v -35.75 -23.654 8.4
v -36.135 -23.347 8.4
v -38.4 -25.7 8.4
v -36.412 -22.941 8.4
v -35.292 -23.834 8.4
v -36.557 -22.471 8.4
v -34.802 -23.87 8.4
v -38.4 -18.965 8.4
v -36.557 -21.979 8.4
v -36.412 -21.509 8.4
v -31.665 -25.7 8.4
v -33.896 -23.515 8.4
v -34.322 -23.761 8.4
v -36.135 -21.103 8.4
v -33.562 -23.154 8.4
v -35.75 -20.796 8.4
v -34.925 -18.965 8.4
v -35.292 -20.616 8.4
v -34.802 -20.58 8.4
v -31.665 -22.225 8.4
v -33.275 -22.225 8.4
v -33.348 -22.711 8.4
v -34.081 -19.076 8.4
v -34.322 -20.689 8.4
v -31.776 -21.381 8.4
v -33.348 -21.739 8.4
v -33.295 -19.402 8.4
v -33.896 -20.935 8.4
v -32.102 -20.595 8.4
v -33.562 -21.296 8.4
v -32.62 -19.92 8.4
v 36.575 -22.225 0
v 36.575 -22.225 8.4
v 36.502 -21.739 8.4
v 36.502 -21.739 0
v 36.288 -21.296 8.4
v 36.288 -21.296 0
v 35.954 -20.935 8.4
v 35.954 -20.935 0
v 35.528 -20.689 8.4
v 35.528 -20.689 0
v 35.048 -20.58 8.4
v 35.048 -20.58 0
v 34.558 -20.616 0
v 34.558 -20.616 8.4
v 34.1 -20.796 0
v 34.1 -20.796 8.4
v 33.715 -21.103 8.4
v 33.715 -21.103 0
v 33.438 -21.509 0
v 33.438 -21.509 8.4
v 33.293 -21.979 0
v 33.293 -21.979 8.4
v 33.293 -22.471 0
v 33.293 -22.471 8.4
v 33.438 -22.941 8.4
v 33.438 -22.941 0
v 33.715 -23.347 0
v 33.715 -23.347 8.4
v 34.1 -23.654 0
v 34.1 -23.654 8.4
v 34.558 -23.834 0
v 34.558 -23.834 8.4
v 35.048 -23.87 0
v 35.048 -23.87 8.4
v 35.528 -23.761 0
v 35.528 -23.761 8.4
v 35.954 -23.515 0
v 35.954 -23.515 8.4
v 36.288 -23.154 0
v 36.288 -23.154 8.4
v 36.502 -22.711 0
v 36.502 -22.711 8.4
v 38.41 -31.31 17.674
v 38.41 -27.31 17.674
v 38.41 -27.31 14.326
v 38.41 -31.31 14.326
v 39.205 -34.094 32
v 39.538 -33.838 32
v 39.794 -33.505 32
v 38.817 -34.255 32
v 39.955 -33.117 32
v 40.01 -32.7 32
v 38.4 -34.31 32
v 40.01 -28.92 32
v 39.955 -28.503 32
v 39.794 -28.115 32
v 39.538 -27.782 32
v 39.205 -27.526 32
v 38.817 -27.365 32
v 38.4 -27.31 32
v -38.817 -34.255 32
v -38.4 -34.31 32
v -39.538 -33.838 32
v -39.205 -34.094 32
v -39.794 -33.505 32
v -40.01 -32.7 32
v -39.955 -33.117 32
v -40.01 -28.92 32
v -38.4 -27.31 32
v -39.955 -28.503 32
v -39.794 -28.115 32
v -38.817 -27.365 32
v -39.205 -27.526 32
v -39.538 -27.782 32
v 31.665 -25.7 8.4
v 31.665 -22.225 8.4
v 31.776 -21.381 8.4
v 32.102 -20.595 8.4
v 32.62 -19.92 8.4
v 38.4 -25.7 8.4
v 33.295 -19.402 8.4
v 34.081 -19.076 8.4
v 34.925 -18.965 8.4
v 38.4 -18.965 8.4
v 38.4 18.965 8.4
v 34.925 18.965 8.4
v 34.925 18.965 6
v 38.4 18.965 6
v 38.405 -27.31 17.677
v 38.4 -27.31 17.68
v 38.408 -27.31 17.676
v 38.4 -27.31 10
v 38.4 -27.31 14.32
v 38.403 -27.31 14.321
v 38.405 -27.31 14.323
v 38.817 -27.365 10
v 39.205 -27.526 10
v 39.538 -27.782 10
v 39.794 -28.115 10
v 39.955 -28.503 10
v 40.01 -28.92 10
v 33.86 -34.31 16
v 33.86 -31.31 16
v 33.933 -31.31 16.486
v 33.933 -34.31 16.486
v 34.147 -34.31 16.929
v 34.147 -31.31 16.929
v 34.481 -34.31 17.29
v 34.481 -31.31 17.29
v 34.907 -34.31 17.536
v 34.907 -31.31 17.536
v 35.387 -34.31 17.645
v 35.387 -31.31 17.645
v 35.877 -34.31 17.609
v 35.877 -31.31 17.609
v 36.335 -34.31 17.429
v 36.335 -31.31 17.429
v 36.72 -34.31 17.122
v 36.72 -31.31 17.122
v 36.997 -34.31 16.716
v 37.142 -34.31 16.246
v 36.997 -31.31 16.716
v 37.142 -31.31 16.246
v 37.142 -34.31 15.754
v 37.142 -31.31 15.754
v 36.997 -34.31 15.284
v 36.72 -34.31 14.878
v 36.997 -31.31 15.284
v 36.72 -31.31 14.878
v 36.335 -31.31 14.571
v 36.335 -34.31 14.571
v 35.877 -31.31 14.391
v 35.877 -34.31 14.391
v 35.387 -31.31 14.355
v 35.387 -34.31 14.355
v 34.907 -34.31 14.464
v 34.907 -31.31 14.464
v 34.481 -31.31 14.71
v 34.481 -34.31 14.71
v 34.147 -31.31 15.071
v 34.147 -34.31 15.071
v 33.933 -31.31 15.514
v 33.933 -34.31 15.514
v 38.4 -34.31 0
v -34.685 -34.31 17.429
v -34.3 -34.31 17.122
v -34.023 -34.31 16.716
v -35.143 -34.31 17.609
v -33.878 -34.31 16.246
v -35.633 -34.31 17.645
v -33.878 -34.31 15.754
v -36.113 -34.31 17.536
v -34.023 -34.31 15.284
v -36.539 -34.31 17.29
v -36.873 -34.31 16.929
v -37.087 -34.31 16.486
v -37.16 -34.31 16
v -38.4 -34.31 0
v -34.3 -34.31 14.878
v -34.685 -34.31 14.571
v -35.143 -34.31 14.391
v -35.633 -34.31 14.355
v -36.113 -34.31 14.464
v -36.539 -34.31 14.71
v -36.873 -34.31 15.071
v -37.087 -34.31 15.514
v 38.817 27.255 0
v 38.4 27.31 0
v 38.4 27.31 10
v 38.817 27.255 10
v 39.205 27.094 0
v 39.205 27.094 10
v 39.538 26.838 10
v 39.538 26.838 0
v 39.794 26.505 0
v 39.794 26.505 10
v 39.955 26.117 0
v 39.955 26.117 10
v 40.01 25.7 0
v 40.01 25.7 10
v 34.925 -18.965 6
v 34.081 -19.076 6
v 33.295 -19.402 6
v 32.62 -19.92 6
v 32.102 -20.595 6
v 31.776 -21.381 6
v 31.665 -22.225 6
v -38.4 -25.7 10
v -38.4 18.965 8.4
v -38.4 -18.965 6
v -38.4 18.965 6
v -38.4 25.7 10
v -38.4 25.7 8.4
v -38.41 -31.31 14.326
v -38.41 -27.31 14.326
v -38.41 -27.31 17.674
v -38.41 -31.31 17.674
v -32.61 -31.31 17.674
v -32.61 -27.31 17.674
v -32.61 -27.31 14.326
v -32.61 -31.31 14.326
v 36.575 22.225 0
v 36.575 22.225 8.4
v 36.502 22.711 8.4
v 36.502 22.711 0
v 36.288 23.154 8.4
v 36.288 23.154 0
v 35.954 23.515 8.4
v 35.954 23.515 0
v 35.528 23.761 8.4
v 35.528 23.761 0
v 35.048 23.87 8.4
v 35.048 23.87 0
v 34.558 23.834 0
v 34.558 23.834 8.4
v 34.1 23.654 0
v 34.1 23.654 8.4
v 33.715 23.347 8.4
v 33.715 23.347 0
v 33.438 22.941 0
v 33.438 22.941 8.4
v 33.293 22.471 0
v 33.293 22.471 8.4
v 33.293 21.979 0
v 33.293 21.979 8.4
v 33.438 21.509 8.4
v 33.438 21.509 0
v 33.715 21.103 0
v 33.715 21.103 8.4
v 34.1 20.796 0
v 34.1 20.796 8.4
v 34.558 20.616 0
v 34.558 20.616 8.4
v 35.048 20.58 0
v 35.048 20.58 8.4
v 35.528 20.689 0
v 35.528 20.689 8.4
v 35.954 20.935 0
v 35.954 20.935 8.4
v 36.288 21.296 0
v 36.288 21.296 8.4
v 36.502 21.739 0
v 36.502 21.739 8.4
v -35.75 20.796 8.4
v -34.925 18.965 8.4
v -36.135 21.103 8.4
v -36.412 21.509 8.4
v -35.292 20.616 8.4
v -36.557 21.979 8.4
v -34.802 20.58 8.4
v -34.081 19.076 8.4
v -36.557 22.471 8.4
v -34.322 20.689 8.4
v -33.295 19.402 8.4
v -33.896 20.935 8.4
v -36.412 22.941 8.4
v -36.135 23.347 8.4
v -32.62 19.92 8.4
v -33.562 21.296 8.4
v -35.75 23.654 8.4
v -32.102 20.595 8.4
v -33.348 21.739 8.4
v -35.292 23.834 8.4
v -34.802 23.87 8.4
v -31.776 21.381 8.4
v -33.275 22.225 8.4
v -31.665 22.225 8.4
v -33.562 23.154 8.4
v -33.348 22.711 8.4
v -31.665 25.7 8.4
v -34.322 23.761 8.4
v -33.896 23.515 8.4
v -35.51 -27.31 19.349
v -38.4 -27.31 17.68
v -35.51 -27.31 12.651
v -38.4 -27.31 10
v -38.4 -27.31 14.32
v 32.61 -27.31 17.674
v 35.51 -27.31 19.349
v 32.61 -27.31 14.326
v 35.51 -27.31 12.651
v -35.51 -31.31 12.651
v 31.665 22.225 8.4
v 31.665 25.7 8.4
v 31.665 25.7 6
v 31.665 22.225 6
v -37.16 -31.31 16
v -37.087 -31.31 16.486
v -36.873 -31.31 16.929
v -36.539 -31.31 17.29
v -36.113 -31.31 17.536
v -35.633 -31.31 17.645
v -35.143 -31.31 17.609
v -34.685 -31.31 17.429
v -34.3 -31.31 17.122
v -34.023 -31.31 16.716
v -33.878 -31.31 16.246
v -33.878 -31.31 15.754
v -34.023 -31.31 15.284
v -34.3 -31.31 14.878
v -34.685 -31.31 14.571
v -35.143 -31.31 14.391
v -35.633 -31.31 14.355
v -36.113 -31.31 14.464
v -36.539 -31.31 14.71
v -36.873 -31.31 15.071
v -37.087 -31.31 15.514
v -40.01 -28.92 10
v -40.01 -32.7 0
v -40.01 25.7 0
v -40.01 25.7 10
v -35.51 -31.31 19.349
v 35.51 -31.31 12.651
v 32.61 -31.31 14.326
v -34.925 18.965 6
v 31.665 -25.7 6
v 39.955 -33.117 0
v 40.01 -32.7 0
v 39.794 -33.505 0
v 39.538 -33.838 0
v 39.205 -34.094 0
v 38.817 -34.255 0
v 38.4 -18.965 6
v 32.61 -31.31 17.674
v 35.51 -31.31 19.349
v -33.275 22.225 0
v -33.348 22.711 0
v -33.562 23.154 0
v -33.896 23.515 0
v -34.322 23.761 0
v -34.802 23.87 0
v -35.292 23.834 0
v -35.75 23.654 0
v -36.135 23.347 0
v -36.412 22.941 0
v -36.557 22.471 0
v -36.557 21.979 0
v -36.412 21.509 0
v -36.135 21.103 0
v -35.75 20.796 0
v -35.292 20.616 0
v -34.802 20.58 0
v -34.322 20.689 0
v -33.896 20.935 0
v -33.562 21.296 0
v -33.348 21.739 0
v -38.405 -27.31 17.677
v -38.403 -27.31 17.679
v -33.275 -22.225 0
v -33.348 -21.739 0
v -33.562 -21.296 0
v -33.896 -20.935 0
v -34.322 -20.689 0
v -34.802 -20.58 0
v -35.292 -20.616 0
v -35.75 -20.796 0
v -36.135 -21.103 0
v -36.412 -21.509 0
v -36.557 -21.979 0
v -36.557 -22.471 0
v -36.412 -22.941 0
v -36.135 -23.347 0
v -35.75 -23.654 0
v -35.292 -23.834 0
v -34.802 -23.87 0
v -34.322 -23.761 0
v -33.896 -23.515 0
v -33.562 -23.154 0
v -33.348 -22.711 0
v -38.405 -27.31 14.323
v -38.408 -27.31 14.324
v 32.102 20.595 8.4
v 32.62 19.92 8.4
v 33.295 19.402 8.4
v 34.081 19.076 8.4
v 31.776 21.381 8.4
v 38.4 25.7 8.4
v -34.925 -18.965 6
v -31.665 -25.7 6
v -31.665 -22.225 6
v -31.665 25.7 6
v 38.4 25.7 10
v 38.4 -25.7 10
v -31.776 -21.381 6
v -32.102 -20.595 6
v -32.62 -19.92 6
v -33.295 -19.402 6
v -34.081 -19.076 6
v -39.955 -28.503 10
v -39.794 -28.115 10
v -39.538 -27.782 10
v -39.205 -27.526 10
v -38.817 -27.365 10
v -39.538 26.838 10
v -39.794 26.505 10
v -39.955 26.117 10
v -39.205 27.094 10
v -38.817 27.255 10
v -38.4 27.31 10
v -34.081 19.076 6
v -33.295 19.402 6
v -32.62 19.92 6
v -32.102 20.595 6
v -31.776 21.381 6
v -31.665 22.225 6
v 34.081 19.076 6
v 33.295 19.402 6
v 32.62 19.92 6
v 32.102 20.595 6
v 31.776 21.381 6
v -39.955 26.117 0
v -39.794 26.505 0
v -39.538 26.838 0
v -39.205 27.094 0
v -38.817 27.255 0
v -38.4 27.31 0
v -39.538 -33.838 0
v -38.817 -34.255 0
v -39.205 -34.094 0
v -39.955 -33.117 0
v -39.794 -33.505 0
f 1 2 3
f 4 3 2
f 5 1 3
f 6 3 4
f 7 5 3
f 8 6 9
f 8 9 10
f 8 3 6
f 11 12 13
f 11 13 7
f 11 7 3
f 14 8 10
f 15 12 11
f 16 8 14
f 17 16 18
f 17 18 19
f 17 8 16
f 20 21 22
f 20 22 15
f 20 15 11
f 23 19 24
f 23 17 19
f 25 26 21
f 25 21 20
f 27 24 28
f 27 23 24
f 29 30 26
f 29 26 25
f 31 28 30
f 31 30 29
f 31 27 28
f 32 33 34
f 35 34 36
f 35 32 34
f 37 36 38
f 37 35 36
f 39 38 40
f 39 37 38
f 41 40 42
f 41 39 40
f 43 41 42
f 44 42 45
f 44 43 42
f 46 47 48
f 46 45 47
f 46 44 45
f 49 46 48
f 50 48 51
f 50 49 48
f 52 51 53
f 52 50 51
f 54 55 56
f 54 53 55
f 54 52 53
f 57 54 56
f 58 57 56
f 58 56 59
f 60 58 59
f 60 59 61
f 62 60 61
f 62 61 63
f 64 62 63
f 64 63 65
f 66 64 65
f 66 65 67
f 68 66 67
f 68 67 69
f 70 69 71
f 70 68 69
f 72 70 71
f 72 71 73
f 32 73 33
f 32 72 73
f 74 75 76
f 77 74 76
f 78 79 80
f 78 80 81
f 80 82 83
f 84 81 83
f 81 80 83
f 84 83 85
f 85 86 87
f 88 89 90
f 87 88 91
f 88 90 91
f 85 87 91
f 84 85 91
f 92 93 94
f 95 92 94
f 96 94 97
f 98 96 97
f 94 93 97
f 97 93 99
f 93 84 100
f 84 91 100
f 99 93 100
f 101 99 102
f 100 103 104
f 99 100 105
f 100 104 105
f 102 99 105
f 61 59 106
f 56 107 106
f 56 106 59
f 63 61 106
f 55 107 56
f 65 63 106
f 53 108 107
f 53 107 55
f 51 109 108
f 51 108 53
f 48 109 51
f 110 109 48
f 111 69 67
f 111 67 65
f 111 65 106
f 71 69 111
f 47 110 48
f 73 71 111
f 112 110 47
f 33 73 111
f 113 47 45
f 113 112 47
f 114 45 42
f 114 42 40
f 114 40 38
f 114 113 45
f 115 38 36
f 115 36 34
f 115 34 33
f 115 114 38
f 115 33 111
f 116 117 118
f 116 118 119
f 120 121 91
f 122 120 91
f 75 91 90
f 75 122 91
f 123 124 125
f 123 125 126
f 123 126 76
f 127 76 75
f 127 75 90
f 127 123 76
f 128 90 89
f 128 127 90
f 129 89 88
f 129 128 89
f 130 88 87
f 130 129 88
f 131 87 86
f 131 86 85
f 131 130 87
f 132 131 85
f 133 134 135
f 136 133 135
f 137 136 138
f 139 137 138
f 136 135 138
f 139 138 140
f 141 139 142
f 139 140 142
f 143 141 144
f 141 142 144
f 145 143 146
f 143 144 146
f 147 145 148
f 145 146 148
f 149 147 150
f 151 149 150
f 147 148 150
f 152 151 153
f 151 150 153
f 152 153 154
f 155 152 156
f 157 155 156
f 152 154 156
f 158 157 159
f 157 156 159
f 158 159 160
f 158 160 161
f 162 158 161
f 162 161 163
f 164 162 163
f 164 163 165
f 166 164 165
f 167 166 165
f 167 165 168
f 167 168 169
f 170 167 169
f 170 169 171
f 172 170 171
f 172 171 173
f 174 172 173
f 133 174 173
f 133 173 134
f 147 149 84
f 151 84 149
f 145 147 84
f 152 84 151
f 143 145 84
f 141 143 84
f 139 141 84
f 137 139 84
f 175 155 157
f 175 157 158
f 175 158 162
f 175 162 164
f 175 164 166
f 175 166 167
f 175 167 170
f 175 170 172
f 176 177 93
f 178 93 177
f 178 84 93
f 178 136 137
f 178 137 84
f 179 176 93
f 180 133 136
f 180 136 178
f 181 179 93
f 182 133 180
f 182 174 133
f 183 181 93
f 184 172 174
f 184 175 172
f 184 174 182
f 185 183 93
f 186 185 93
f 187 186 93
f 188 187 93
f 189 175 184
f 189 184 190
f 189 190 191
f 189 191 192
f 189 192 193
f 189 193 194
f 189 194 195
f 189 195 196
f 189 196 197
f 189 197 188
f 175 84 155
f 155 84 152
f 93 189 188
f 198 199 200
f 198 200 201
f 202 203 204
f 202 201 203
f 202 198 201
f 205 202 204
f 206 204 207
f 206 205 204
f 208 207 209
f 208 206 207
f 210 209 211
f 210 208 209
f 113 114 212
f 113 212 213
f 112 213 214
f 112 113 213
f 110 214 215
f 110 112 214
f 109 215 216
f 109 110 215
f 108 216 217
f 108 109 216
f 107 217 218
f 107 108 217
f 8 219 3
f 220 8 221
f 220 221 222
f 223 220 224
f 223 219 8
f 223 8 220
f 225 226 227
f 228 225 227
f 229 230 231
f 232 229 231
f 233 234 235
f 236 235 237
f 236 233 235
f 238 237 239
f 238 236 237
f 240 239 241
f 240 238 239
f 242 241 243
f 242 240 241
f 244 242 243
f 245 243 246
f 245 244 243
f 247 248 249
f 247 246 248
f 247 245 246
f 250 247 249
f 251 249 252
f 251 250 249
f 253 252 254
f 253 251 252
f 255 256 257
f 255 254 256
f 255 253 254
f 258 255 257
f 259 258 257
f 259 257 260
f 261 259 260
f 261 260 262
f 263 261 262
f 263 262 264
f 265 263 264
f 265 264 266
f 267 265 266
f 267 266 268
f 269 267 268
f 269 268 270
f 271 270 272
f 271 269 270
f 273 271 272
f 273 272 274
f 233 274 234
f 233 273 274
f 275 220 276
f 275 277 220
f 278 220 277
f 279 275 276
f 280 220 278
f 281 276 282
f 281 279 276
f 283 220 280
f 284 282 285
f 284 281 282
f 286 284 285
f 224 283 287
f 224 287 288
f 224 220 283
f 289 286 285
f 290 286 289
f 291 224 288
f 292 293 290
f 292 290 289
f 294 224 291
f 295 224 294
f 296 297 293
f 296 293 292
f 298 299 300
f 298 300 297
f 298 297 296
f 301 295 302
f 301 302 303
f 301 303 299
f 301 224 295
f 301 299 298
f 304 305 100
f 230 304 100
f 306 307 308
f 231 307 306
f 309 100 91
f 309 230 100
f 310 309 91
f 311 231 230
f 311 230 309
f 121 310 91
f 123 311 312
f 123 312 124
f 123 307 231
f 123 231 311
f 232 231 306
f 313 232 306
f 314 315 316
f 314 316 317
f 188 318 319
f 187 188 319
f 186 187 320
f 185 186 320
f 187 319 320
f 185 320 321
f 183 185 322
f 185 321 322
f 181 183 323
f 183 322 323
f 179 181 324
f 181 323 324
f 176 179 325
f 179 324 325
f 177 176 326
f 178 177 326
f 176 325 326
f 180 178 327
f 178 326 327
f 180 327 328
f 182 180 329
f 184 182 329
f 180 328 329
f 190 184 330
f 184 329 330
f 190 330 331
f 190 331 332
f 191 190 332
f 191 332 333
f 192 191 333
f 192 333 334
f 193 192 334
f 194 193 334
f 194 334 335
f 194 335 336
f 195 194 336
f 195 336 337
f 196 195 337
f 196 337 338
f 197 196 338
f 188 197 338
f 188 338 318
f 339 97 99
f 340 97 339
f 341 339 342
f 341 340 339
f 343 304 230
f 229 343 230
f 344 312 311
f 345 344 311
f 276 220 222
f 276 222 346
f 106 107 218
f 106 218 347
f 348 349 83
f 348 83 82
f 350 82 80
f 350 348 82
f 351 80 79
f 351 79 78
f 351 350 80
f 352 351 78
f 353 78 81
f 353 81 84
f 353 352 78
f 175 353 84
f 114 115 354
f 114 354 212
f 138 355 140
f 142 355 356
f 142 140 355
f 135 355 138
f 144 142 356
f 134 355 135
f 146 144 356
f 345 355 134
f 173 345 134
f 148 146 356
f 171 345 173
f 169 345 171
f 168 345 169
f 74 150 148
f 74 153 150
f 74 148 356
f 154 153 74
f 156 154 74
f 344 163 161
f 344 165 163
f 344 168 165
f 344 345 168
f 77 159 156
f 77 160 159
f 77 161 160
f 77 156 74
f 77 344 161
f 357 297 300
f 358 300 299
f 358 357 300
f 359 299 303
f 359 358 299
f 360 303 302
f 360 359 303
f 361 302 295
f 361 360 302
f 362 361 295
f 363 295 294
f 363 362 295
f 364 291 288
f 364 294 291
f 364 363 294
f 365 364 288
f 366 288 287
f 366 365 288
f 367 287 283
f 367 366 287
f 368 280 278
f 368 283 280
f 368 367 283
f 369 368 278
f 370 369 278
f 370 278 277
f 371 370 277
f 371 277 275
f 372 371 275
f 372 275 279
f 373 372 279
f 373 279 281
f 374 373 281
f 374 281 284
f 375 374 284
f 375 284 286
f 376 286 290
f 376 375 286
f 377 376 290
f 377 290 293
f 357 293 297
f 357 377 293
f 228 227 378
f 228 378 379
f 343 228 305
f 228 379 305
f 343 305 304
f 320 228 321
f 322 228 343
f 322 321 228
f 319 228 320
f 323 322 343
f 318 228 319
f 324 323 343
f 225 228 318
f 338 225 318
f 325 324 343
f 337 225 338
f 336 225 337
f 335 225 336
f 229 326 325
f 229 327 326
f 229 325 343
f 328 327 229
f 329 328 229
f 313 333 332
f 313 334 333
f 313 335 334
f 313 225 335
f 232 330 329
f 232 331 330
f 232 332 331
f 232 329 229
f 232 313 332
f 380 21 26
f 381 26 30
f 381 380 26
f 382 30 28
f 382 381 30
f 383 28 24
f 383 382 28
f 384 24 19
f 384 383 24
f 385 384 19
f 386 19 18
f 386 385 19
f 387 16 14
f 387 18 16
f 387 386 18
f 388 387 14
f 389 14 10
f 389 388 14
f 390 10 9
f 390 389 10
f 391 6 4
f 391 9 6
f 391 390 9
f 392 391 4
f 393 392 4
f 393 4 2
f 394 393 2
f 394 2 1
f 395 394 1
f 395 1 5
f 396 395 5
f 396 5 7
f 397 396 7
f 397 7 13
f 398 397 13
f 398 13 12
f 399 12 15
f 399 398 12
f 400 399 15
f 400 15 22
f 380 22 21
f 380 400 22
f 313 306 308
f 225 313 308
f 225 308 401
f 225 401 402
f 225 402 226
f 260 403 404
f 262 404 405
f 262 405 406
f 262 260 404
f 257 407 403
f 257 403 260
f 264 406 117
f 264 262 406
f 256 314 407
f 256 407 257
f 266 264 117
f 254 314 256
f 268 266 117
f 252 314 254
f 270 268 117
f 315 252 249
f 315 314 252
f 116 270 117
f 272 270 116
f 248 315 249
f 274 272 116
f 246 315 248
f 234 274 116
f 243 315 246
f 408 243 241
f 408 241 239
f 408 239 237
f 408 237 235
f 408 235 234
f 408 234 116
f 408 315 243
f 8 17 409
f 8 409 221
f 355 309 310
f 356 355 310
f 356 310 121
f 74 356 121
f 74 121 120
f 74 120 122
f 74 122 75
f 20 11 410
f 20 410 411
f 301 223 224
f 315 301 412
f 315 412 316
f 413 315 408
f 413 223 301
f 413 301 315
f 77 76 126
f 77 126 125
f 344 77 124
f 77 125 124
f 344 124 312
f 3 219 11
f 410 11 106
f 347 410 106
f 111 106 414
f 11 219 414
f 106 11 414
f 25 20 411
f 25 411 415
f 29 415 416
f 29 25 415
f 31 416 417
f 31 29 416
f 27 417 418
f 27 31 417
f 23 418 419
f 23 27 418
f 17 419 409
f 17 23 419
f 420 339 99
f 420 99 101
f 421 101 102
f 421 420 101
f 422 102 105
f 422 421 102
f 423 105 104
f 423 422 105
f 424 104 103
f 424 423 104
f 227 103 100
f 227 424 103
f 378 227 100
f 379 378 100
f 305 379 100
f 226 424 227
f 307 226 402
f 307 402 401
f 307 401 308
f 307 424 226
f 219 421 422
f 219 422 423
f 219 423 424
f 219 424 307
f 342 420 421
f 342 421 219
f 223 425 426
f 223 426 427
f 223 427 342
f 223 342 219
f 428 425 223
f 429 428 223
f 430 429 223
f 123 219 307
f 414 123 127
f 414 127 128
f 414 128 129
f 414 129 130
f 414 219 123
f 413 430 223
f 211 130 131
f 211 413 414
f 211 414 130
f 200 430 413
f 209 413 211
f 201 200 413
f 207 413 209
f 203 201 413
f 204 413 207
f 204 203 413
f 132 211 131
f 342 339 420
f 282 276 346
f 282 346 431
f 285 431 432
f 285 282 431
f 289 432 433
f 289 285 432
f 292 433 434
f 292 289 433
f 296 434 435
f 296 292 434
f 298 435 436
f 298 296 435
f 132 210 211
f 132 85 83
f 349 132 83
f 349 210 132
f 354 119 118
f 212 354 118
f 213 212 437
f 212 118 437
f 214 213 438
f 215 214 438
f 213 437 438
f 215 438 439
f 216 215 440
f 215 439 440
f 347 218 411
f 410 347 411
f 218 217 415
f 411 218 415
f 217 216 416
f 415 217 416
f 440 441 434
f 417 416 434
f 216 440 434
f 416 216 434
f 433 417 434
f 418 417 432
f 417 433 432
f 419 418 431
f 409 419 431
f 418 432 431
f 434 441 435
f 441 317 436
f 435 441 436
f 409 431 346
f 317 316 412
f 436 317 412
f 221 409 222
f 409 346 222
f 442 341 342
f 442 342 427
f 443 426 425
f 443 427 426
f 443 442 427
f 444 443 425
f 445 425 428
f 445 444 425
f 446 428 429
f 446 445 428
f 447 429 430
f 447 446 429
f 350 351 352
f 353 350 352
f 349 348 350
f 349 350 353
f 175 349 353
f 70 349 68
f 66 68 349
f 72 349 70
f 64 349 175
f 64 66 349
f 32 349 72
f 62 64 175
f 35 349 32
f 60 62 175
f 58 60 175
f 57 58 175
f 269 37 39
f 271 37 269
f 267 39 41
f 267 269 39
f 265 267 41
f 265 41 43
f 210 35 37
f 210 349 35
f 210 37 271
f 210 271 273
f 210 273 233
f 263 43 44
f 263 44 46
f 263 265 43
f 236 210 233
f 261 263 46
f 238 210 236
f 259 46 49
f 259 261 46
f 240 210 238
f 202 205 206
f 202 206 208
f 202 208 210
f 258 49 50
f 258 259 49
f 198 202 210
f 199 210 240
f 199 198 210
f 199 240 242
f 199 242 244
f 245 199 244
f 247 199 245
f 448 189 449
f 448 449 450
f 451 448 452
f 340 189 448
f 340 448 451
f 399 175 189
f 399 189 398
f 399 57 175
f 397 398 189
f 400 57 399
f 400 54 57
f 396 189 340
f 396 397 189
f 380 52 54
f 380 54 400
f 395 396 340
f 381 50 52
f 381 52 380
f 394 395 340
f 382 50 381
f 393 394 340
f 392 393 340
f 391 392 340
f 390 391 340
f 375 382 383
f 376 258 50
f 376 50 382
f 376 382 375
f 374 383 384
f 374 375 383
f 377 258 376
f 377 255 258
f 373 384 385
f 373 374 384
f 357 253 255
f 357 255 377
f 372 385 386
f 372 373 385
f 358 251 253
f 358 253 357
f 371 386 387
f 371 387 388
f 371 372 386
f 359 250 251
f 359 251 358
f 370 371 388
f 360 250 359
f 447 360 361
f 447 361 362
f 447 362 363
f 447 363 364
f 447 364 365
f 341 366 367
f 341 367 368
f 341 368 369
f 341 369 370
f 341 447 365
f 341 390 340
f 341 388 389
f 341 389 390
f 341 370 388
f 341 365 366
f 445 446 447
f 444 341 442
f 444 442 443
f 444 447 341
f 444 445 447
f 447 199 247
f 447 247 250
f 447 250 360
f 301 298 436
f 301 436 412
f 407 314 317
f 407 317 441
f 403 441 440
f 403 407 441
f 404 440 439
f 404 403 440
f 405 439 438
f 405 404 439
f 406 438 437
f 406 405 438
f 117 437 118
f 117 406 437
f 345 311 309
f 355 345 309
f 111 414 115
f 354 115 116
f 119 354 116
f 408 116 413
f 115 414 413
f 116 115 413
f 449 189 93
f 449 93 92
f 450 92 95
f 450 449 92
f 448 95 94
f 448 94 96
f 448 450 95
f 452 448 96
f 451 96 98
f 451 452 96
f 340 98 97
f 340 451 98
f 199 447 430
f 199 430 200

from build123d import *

# Parameters (mm, degrees)
SKETCH1_R           = 1.65
BOSS_EXTRUDE1_DEPTH = 32
CUT_EXTRUDE3_START  = -22
CUT_EXTRUDE3_DEPTH  = 22
CUT_EXTRUDE1_DEPTH  = 26
SKETCH3_W           = 76.8
SKETCH3_H           = 51.4
CUT_EXTRUDE2_DEPTH  = 23.6
CUT_EXTRUDE4_REACH  = 76.888
SKETCH5_R           = 1.65
CUT_EXTRUDE5_DEPTH  = 4


with BuildPart() as part:
    # Sketch1 → Boss-Extrude1 (new body)
    with BuildSketch(Plane.XY):
        with BuildLine():
            Line((-40.01, -32.7), (-40.01, 25.7))
            ThreePointArc((-40.01, 25.7), (-39.538441918, 26.838441918), (-38.4, 27.31))
            Line((-38.4, 27.31), (38.4, 27.31))
            ThreePointArc((38.4, 27.31), (39.538441918, 26.838441918), (40.01, 25.7))
            Line((40.01, 25.7), (40.01, -32.7))
            ThreePointArc((40.01, -32.7), (39.538441918, -33.838441918), (38.4, -34.31))
            Line((38.4, -34.31), (-38.4, -34.31))
            ThreePointArc((-38.4, -34.31), (-39.538441918, -33.838441918), (-40.01, -32.7))
        make_face()
        with Locations((-34.925, 22.225)):
            Circle(SKETCH1_R, mode=Mode.SUBTRACT)
        with Locations((-34.925, -22.225)):
            Circle(SKETCH1_R, mode=Mode.SUBTRACT)
        with Locations((34.925, 22.225)):
            Circle(SKETCH1_R, mode=Mode.SUBTRACT)
        with Locations((34.925, -22.225)):
            Circle(SKETCH1_R, mode=Mode.SUBTRACT)
    extrude(amount=BOSS_EXTRUDE1_DEPTH)

    # Sketch4 → Cut-Extrude3 (cut)
    with BuildSketch(Plane.XY.offset(32).offset(CUT_EXTRUDE3_START)):
        with BuildLine():
            Line((-38.4, -27.31), (38.4, -27.31))
            ThreePointArc((38.4, -27.31), (39.538441918, -27.781558082), (40.01, -28.92))
            Line((40.01, -28.92), (40.01, 25.7))
            ThreePointArc((40.01, 25.7), (39.538441918, 26.838441918), (38.4, 27.31))
            Line((38.4, 27.31), (-38.4, 27.31))
            ThreePointArc((-38.4, 27.31), (-39.538441918, 26.838441918), (-40.01, 25.7))
            Line((-40.01, 25.7), (-40.01, -28.92))
            ThreePointArc((-40.01, -28.92), (-39.538441918, -27.781558082), (-38.4, -27.31))
        make_face()
    extrude(amount=CUT_EXTRUDE3_DEPTH, mode=Mode.SUBTRACT)

    # Sketch2 → Cut-Extrude1 (cut)
    with BuildSketch(Plane.XY.offset(32)):
        with BuildLine():
            Line((-31.665, 25.7), (31.665, 25.7))
            Line((31.665, 25.7), (31.665, 22.225))
            ThreePointArc((31.665, 22.225), (32.619831893, 19.919831893), (34.925, 18.965))
            Line((34.925, 18.965), (38.4, 18.965))
            Line((38.4, 18.965), (38.4, -18.965))
            Line((38.4, -18.965), (34.925, -18.965))
            ThreePointArc((34.925, -18.965), (32.619831893, -19.919831893), (31.665, -22.225))
            Line((31.665, -22.225), (31.665, -25.7))
            Line((31.665, -25.7), (-31.665, -25.7))
            Line((-31.665, -25.7), (-31.665, -22.225))
            ThreePointArc((-31.665, -22.225), (-32.619831893, -19.919831893), (-34.925, -18.965))
            Line((-34.925, -18.965), (-38.4, -18.965))
            Line((-38.4, -18.965), (-38.4, 18.965))
            Line((-38.4, 18.965), (-34.925, 18.965))
            ThreePointArc((-34.925, 18.965), (-32.619831893, 19.919831893), (-31.665, 22.225))
            Line((-31.665, 22.225), (-31.665, 25.7))
        make_face()
    extrude(amount=-CUT_EXTRUDE1_DEPTH, mode=Mode.SUBTRACT)

    # Sketch3 → Cut-Extrude2 (cut)
    with BuildSketch(Plane.XY.offset(32)):
        Rectangle(SKETCH3_W, SKETCH3_H)
    extrude(amount=-CUT_EXTRUDE2_DEPTH, mode=Mode.SUBTRACT)

    # Sketch5 → Cut-Extrude4 (cut, up to next)
    with BuildSketch(Plane(origin=(0, -27.31, 0), x_dir=(1, 0, 0), z_dir=(0, 1, 0)), mode=Mode.PRIVATE) as cut_extrude4_sk1:
        with Locations(Location((-35.51, -16, 0), (0, 0, 180))):
            Circle(SKETCH5_R)
    cut_extrude4_tool1 = extrude(cut_extrude4_sk1.sketch, amount=-CUT_EXTRUDE4_REACH, mode=Mode.PRIVATE) & part.part
    # Sketch5 → Cut-Extrude4 (cut, up to next)
    with BuildSketch(Plane(origin=(0, -27.31, 0), x_dir=(1, 0, 0), z_dir=(0, 1, 0)), mode=Mode.PRIVATE) as cut_extrude4_sk2:
        with Locations(Location((35.51, -16, 0), (0, 0, 180))):
            Circle(SKETCH5_R)
    cut_extrude4_tool2 = extrude(cut_extrude4_sk2.sketch, amount=-CUT_EXTRUDE4_REACH, mode=Mode.PRIVATE) & part.part
    add(cut_extrude4_tool1.solids().sort_by_distance((-35.51, -27.31, 16))[0], mode=Mode.SUBTRACT)
    add(cut_extrude4_tool2.solids().sort_by_distance((35.51, -27.31, 16))[0], mode=Mode.SUBTRACT)

    # Sketch6 → Cut-Extrude5 (cut)
    with BuildSketch(Plane(origin=(0, -27.31, 0), x_dir=(1, 0, 0), z_dir=(0, 1, 0))):
        Polygon((-35.51, -19.348631561), (-32.61, -17.674315781), (-32.61, -14.325684219), (-35.51, -12.651368439), (-38.41, -14.325684219), (-38.41, -17.674315781), align=None)
        Polygon((35.51, -19.348631561), (38.41, -17.674315781), (38.41, -14.325684219), (35.51, -12.651368439), (32.61, -14.325684219), (32.61, -17.674315781), align=None)
    extrude(amount=-CUT_EXTRUDE5_DEPTH, mode=Mode.SUBTRACT)


solid = part.part
